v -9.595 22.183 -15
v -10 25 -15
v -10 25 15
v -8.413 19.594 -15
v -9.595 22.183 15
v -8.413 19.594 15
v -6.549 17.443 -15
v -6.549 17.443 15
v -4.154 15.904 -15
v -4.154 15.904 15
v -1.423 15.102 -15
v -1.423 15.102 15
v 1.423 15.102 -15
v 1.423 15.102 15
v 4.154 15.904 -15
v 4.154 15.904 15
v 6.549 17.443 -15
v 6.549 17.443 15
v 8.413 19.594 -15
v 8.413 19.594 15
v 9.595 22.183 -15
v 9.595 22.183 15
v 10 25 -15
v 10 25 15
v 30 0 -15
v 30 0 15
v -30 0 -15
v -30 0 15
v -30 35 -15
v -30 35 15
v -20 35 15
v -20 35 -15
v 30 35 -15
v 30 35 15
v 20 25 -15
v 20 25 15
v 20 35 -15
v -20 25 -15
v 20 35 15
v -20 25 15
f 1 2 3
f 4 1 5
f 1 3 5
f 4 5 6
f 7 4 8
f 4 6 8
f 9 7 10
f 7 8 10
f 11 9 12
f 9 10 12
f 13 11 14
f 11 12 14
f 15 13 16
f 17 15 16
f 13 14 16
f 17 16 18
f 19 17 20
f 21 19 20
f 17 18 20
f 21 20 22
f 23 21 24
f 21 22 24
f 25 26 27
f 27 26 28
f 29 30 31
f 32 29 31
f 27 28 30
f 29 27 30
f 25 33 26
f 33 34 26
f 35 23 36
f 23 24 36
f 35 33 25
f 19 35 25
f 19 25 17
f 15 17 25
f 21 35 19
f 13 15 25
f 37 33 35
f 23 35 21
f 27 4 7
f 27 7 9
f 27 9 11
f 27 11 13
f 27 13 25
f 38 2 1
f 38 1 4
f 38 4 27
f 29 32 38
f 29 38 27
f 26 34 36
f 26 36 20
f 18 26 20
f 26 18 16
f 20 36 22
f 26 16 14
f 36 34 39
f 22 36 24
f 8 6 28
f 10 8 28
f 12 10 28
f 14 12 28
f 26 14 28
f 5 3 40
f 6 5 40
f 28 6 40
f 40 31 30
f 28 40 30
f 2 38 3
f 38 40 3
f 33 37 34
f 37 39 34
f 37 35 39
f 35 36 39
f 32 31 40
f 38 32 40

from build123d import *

# Parameters (mm, degrees)
BOSS_EXTRUDE1_DEPTH = 15


with BuildPart() as part:
    # Sketch1 → Boss-Extrude1 (new, symmetric)
    with BuildSketch(Plane.XY):
        with BuildLine():
            Line((-20, 35), (-20, 25))
            Line((-20, 25), (-10, 25))
            ThreePointArc((-10, 25), (0, 15), (10, 25))
            Line((10, 25), (20, 25))
            Line((20, 25), (20, 35))
            Line((20, 35), (30, 35))
            Line((30, 35), (30, 0))
            Line((30, 0), (-30, 0))
            Line((-30, 0), (-30, 35))
            Line((-30, 35), (-20, 35))
        make_face()
    extrude(amount=BOSS_EXTRUDE1_DEPTH, both=True)


solid = part.part
